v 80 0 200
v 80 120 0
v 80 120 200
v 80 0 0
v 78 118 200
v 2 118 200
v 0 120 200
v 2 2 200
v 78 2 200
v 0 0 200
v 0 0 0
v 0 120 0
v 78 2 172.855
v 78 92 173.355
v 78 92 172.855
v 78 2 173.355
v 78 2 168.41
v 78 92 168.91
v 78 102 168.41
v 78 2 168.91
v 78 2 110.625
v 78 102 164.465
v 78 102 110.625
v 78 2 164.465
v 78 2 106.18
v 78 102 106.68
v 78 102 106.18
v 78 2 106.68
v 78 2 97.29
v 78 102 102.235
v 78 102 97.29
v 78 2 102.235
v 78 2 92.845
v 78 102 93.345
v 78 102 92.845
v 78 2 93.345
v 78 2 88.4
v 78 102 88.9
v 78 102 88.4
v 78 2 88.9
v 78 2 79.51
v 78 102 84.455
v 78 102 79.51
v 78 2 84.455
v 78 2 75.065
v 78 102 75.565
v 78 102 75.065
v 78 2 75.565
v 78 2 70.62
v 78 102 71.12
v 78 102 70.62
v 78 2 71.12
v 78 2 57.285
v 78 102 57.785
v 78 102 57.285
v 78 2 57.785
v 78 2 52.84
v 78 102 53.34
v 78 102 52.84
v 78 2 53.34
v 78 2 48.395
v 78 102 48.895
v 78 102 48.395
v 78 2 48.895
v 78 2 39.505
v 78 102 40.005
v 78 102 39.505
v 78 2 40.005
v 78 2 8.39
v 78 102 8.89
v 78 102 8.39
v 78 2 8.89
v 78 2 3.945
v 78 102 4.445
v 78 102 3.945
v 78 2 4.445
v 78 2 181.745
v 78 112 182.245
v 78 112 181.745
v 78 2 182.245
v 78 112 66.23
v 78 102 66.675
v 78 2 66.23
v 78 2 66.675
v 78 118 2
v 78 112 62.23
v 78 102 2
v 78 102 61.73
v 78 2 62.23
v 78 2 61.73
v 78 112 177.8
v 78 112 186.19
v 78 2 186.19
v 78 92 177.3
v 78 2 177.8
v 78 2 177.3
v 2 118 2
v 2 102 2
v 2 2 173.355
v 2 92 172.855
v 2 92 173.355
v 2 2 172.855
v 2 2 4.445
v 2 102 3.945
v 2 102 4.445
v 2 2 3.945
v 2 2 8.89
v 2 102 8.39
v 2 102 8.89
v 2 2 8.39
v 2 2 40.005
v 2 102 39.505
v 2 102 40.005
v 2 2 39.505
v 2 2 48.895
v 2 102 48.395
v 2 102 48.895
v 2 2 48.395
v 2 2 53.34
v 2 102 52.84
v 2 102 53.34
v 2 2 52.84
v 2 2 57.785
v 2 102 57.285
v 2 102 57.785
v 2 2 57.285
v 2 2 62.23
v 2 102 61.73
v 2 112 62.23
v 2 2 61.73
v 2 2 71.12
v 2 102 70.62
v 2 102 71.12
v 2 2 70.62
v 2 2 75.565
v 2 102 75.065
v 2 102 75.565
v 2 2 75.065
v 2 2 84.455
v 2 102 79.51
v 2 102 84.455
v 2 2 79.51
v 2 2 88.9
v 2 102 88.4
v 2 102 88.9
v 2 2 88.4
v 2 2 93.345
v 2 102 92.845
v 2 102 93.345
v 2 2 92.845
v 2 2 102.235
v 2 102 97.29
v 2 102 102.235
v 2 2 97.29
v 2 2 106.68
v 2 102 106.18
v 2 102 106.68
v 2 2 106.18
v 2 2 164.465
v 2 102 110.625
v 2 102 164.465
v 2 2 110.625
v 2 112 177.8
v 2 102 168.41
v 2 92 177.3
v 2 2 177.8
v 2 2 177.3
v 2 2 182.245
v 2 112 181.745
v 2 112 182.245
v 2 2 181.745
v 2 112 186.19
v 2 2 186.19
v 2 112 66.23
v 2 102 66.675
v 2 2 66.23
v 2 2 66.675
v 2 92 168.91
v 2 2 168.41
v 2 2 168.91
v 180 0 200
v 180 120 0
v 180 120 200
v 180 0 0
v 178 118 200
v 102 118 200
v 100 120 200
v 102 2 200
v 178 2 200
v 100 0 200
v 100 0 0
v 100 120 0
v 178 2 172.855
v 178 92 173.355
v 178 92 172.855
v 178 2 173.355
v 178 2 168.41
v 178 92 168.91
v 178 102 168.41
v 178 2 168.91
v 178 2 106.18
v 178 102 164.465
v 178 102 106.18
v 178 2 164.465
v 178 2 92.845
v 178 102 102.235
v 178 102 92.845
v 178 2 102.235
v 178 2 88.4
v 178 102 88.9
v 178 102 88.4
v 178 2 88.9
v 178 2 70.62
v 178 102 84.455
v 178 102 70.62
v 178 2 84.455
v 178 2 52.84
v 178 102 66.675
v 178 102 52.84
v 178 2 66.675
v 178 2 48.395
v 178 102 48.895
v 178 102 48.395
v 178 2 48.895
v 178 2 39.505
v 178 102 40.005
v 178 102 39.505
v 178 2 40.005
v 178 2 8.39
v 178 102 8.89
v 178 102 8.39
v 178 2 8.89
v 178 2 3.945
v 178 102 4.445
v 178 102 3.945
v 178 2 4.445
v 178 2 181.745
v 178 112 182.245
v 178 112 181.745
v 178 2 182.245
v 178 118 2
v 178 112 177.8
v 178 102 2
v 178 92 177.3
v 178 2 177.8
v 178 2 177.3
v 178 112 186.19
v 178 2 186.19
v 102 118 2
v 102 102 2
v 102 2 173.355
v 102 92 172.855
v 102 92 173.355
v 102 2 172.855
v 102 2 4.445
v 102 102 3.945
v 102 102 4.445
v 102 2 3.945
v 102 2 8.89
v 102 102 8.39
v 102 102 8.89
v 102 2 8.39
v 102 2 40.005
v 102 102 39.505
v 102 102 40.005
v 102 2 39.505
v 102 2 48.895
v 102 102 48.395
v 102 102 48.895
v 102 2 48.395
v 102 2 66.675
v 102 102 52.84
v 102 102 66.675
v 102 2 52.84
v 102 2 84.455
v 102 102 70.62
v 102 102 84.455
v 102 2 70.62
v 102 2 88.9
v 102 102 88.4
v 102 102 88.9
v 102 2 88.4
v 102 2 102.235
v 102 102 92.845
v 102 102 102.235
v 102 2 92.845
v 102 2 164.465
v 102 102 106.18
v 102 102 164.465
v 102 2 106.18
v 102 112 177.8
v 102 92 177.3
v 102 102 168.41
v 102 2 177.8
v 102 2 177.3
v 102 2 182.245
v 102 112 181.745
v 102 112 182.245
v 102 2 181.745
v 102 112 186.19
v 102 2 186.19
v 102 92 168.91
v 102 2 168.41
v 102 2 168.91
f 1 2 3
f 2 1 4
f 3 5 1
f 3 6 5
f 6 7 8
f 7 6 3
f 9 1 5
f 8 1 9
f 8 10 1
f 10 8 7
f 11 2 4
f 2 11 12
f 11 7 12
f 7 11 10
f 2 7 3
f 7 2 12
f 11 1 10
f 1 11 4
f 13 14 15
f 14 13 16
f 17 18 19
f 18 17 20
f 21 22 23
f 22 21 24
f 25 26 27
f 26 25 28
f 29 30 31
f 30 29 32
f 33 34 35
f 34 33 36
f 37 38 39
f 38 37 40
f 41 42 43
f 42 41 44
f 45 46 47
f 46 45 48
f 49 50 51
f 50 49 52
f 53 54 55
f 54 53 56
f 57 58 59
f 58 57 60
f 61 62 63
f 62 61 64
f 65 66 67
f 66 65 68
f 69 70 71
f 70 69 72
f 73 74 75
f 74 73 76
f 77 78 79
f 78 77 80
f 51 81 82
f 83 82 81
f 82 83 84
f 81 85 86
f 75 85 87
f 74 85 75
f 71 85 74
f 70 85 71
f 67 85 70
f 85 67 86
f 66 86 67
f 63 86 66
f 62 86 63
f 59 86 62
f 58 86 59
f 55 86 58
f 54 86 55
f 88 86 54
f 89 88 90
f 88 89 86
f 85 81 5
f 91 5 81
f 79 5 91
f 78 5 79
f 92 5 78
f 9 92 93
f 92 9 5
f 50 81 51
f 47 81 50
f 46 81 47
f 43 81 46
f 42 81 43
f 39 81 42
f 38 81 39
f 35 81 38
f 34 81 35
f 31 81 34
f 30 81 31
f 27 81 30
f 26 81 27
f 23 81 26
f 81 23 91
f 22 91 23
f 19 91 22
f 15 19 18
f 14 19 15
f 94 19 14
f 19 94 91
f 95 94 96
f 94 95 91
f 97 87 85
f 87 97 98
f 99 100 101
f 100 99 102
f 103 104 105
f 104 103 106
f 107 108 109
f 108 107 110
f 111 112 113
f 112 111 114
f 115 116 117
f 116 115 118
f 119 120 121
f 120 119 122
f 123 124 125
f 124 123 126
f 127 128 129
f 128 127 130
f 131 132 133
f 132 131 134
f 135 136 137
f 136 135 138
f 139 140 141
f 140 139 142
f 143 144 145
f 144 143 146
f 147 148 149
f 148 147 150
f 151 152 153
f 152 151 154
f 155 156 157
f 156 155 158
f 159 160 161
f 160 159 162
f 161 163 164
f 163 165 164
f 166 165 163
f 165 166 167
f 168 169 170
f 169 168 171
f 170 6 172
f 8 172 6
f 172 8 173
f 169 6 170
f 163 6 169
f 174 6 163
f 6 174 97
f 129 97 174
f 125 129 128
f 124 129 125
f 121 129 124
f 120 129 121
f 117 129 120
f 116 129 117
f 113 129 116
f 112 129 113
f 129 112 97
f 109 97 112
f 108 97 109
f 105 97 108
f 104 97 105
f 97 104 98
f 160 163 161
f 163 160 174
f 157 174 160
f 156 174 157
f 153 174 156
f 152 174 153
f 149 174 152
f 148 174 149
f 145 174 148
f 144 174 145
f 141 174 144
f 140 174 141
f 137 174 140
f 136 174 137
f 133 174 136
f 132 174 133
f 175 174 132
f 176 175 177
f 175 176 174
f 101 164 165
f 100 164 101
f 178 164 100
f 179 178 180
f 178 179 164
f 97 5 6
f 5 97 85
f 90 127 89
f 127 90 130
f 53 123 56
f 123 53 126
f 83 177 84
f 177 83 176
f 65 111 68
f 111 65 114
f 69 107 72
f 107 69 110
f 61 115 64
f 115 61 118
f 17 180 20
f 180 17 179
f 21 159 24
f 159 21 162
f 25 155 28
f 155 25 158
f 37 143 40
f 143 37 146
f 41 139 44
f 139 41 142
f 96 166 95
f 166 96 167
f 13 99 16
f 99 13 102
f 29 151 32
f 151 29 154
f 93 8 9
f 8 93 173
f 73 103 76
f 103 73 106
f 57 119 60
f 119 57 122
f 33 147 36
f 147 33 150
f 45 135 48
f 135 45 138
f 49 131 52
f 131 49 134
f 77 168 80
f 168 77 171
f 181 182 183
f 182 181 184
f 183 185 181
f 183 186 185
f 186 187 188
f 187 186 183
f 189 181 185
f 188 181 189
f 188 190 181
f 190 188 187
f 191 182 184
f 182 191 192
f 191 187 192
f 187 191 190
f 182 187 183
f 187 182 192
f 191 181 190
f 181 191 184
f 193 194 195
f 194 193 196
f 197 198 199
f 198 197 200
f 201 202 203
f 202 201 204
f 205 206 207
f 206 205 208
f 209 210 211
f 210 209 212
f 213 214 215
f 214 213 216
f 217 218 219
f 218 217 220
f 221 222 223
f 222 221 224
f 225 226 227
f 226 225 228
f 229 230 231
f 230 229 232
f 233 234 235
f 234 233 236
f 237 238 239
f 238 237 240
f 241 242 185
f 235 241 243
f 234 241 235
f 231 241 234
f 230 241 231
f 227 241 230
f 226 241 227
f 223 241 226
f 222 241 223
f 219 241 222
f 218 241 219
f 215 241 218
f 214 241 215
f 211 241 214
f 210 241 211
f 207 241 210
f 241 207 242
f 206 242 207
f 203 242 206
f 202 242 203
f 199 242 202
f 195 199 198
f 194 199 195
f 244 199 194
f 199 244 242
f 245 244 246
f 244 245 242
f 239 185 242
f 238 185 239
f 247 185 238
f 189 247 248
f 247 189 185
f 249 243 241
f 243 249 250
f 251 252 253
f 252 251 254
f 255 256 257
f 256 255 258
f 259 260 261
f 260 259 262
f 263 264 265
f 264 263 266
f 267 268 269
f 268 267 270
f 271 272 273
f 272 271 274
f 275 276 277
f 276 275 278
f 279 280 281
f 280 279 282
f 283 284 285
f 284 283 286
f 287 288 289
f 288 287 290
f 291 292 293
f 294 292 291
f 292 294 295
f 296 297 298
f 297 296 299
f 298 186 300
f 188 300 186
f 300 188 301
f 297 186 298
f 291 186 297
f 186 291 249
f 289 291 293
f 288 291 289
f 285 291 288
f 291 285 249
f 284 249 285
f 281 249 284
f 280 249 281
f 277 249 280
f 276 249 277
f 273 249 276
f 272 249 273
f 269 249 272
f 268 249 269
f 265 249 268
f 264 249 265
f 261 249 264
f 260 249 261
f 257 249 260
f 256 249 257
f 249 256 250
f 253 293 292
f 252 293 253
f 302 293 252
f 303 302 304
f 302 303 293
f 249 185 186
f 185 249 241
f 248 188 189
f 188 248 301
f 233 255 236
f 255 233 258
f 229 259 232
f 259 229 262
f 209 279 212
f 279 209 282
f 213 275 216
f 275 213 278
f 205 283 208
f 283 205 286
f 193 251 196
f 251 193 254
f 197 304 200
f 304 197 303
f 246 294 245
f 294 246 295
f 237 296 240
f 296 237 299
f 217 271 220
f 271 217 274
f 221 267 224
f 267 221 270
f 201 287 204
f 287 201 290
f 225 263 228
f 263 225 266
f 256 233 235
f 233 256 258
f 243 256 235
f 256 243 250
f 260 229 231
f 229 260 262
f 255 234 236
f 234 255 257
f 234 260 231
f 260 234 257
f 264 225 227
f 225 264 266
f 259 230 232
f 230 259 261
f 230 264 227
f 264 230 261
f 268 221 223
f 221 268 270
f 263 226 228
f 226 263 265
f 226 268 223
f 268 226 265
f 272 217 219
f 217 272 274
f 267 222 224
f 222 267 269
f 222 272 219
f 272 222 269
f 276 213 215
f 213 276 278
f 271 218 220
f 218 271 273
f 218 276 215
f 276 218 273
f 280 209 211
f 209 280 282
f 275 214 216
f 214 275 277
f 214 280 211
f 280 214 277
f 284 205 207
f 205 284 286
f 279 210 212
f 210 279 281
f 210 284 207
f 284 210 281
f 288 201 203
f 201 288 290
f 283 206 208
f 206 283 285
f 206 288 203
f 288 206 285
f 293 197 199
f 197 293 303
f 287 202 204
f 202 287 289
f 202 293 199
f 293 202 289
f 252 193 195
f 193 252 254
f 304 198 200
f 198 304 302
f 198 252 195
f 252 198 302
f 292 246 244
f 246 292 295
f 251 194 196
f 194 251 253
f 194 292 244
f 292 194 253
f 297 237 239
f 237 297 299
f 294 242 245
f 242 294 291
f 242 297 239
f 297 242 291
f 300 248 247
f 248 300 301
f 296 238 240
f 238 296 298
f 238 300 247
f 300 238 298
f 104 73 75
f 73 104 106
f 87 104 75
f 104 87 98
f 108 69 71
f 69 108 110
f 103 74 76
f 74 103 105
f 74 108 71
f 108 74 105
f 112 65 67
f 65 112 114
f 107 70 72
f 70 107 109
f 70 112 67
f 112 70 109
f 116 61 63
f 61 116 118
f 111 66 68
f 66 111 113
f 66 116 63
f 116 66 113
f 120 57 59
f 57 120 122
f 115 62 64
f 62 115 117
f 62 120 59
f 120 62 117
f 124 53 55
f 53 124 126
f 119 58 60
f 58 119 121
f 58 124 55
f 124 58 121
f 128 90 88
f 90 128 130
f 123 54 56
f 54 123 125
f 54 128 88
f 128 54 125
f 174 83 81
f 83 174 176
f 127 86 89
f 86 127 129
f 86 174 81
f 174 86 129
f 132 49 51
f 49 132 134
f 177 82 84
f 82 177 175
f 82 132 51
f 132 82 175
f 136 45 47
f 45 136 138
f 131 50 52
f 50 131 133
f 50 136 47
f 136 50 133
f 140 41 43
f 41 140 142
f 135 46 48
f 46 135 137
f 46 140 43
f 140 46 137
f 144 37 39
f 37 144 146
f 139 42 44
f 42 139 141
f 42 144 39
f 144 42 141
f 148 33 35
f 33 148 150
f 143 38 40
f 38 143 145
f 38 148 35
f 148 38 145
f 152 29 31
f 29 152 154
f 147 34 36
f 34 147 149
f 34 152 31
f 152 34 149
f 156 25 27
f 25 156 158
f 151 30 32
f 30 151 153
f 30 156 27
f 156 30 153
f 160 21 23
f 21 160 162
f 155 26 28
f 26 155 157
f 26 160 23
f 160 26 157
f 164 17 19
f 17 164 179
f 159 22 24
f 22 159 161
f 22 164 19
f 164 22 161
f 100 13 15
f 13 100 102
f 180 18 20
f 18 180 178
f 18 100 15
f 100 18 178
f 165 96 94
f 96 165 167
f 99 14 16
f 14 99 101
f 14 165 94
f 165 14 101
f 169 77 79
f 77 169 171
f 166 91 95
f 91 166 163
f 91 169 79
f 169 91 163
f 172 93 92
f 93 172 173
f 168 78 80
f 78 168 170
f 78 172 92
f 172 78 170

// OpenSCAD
// Parámetros básicos
rackWidth = 80;   // Ancho del rack (cm o mm según escala)
rackDepth = 120;  // Profundidad
rackHeight = 200; // Altura total (e.g. 42U * altura unidad)
unitHeight = 4.445; // Altura estándar de 1U en mm (~1.75 pulgadas = 44.45mm, aquí escala reducida)

rackWallThickness = 2;

// Colores
rackColor = [0.6, 0.6, 0.6];
deviceColor = [0.2, 0.2, 0.8];
cableGuideColor = [0.8, 0.5, 0.2];
patchPanelColor = [0.1, 0.7, 0.1];
shelfColor = [0.5, 0.3, 0.7];

// Módulo: rack base
module rack() {
    color(rackColor)
    difference() {
        // Caja del rack exterior
        cube([rackWidth, rackDepth, rackHeight]);
        // Hueco interior (paredes)
        translate([rackWallThickness, rackWallThickness, rackWallThickness])
            cube([rackWidth - 2*rackWallThickness, rackDepth - 2*rackWallThickness, rackHeight]);
    }
}

// Módulo: dispositivo (posición en U, altura en U, profundidad)
module device(u_pos, u_height=1, depth=100, col=deviceColor) {
    color(col)
    translate([rackWallThickness, rackWallThickness, u_pos * unitHeight])
        cube([rackWidth - 2*rackWallThickness, depth, u_height * unitHeight - 0.5]);
}

// Módulo: cable guide
module cable_guide(u_pos) {
    device(u_pos, 1, rackDepth - 10, cableGuideColor);
}

// Módulo: patch panel
module patch_panel(u_pos) {
    device(u_pos, 1, rackDepth - 30, patchPanelColor);
}

// Módulo: shelf
module shelf(u_pos, thickness=4) {
    color(shelfColor)
    translate([rackWallThickness, rackWallThickness, u_pos * unitHeight])
        cube([rackWidth - 2*rackWallThickness, rackDepth - 10, thickness]);
}

// Ensamblaje rack con dispositivos
rack();

// Dispositivos rack 1
device(0, 1);
device(1, 1);
device(2, 7);
device(9, 2);
device(11, 1);
device(12, 1);
device(13, 1);
shelf(14);
device(15, 1);
device(16, 1);
device(17, 1);
device(19, 1);
device(20, 1);
device(21, 1);
device(23, 1);
device(24, 1);
device(37, 1);
patch_panel(38);
patch_panel(39);
cable_guide(40);
cable_guide(41);

// Puedes añadir otro rack desplazando en X o Y

translate([rackWidth + 20, 0, 0]) {
    rack();

    // Dispositivos rack 2
    device(0, 1);
    device(1, 1);
    device(2, 7);
    device(9, 2);
    device(11, 1);
    device(15, 1);
    device(19, 1);
    device(20, 1);
    device(23, 1);
    device(37, 1);
    patch_panel(38);
    patch_panel(39);
    cable_guide(40);
    cable_guide(41);
}
